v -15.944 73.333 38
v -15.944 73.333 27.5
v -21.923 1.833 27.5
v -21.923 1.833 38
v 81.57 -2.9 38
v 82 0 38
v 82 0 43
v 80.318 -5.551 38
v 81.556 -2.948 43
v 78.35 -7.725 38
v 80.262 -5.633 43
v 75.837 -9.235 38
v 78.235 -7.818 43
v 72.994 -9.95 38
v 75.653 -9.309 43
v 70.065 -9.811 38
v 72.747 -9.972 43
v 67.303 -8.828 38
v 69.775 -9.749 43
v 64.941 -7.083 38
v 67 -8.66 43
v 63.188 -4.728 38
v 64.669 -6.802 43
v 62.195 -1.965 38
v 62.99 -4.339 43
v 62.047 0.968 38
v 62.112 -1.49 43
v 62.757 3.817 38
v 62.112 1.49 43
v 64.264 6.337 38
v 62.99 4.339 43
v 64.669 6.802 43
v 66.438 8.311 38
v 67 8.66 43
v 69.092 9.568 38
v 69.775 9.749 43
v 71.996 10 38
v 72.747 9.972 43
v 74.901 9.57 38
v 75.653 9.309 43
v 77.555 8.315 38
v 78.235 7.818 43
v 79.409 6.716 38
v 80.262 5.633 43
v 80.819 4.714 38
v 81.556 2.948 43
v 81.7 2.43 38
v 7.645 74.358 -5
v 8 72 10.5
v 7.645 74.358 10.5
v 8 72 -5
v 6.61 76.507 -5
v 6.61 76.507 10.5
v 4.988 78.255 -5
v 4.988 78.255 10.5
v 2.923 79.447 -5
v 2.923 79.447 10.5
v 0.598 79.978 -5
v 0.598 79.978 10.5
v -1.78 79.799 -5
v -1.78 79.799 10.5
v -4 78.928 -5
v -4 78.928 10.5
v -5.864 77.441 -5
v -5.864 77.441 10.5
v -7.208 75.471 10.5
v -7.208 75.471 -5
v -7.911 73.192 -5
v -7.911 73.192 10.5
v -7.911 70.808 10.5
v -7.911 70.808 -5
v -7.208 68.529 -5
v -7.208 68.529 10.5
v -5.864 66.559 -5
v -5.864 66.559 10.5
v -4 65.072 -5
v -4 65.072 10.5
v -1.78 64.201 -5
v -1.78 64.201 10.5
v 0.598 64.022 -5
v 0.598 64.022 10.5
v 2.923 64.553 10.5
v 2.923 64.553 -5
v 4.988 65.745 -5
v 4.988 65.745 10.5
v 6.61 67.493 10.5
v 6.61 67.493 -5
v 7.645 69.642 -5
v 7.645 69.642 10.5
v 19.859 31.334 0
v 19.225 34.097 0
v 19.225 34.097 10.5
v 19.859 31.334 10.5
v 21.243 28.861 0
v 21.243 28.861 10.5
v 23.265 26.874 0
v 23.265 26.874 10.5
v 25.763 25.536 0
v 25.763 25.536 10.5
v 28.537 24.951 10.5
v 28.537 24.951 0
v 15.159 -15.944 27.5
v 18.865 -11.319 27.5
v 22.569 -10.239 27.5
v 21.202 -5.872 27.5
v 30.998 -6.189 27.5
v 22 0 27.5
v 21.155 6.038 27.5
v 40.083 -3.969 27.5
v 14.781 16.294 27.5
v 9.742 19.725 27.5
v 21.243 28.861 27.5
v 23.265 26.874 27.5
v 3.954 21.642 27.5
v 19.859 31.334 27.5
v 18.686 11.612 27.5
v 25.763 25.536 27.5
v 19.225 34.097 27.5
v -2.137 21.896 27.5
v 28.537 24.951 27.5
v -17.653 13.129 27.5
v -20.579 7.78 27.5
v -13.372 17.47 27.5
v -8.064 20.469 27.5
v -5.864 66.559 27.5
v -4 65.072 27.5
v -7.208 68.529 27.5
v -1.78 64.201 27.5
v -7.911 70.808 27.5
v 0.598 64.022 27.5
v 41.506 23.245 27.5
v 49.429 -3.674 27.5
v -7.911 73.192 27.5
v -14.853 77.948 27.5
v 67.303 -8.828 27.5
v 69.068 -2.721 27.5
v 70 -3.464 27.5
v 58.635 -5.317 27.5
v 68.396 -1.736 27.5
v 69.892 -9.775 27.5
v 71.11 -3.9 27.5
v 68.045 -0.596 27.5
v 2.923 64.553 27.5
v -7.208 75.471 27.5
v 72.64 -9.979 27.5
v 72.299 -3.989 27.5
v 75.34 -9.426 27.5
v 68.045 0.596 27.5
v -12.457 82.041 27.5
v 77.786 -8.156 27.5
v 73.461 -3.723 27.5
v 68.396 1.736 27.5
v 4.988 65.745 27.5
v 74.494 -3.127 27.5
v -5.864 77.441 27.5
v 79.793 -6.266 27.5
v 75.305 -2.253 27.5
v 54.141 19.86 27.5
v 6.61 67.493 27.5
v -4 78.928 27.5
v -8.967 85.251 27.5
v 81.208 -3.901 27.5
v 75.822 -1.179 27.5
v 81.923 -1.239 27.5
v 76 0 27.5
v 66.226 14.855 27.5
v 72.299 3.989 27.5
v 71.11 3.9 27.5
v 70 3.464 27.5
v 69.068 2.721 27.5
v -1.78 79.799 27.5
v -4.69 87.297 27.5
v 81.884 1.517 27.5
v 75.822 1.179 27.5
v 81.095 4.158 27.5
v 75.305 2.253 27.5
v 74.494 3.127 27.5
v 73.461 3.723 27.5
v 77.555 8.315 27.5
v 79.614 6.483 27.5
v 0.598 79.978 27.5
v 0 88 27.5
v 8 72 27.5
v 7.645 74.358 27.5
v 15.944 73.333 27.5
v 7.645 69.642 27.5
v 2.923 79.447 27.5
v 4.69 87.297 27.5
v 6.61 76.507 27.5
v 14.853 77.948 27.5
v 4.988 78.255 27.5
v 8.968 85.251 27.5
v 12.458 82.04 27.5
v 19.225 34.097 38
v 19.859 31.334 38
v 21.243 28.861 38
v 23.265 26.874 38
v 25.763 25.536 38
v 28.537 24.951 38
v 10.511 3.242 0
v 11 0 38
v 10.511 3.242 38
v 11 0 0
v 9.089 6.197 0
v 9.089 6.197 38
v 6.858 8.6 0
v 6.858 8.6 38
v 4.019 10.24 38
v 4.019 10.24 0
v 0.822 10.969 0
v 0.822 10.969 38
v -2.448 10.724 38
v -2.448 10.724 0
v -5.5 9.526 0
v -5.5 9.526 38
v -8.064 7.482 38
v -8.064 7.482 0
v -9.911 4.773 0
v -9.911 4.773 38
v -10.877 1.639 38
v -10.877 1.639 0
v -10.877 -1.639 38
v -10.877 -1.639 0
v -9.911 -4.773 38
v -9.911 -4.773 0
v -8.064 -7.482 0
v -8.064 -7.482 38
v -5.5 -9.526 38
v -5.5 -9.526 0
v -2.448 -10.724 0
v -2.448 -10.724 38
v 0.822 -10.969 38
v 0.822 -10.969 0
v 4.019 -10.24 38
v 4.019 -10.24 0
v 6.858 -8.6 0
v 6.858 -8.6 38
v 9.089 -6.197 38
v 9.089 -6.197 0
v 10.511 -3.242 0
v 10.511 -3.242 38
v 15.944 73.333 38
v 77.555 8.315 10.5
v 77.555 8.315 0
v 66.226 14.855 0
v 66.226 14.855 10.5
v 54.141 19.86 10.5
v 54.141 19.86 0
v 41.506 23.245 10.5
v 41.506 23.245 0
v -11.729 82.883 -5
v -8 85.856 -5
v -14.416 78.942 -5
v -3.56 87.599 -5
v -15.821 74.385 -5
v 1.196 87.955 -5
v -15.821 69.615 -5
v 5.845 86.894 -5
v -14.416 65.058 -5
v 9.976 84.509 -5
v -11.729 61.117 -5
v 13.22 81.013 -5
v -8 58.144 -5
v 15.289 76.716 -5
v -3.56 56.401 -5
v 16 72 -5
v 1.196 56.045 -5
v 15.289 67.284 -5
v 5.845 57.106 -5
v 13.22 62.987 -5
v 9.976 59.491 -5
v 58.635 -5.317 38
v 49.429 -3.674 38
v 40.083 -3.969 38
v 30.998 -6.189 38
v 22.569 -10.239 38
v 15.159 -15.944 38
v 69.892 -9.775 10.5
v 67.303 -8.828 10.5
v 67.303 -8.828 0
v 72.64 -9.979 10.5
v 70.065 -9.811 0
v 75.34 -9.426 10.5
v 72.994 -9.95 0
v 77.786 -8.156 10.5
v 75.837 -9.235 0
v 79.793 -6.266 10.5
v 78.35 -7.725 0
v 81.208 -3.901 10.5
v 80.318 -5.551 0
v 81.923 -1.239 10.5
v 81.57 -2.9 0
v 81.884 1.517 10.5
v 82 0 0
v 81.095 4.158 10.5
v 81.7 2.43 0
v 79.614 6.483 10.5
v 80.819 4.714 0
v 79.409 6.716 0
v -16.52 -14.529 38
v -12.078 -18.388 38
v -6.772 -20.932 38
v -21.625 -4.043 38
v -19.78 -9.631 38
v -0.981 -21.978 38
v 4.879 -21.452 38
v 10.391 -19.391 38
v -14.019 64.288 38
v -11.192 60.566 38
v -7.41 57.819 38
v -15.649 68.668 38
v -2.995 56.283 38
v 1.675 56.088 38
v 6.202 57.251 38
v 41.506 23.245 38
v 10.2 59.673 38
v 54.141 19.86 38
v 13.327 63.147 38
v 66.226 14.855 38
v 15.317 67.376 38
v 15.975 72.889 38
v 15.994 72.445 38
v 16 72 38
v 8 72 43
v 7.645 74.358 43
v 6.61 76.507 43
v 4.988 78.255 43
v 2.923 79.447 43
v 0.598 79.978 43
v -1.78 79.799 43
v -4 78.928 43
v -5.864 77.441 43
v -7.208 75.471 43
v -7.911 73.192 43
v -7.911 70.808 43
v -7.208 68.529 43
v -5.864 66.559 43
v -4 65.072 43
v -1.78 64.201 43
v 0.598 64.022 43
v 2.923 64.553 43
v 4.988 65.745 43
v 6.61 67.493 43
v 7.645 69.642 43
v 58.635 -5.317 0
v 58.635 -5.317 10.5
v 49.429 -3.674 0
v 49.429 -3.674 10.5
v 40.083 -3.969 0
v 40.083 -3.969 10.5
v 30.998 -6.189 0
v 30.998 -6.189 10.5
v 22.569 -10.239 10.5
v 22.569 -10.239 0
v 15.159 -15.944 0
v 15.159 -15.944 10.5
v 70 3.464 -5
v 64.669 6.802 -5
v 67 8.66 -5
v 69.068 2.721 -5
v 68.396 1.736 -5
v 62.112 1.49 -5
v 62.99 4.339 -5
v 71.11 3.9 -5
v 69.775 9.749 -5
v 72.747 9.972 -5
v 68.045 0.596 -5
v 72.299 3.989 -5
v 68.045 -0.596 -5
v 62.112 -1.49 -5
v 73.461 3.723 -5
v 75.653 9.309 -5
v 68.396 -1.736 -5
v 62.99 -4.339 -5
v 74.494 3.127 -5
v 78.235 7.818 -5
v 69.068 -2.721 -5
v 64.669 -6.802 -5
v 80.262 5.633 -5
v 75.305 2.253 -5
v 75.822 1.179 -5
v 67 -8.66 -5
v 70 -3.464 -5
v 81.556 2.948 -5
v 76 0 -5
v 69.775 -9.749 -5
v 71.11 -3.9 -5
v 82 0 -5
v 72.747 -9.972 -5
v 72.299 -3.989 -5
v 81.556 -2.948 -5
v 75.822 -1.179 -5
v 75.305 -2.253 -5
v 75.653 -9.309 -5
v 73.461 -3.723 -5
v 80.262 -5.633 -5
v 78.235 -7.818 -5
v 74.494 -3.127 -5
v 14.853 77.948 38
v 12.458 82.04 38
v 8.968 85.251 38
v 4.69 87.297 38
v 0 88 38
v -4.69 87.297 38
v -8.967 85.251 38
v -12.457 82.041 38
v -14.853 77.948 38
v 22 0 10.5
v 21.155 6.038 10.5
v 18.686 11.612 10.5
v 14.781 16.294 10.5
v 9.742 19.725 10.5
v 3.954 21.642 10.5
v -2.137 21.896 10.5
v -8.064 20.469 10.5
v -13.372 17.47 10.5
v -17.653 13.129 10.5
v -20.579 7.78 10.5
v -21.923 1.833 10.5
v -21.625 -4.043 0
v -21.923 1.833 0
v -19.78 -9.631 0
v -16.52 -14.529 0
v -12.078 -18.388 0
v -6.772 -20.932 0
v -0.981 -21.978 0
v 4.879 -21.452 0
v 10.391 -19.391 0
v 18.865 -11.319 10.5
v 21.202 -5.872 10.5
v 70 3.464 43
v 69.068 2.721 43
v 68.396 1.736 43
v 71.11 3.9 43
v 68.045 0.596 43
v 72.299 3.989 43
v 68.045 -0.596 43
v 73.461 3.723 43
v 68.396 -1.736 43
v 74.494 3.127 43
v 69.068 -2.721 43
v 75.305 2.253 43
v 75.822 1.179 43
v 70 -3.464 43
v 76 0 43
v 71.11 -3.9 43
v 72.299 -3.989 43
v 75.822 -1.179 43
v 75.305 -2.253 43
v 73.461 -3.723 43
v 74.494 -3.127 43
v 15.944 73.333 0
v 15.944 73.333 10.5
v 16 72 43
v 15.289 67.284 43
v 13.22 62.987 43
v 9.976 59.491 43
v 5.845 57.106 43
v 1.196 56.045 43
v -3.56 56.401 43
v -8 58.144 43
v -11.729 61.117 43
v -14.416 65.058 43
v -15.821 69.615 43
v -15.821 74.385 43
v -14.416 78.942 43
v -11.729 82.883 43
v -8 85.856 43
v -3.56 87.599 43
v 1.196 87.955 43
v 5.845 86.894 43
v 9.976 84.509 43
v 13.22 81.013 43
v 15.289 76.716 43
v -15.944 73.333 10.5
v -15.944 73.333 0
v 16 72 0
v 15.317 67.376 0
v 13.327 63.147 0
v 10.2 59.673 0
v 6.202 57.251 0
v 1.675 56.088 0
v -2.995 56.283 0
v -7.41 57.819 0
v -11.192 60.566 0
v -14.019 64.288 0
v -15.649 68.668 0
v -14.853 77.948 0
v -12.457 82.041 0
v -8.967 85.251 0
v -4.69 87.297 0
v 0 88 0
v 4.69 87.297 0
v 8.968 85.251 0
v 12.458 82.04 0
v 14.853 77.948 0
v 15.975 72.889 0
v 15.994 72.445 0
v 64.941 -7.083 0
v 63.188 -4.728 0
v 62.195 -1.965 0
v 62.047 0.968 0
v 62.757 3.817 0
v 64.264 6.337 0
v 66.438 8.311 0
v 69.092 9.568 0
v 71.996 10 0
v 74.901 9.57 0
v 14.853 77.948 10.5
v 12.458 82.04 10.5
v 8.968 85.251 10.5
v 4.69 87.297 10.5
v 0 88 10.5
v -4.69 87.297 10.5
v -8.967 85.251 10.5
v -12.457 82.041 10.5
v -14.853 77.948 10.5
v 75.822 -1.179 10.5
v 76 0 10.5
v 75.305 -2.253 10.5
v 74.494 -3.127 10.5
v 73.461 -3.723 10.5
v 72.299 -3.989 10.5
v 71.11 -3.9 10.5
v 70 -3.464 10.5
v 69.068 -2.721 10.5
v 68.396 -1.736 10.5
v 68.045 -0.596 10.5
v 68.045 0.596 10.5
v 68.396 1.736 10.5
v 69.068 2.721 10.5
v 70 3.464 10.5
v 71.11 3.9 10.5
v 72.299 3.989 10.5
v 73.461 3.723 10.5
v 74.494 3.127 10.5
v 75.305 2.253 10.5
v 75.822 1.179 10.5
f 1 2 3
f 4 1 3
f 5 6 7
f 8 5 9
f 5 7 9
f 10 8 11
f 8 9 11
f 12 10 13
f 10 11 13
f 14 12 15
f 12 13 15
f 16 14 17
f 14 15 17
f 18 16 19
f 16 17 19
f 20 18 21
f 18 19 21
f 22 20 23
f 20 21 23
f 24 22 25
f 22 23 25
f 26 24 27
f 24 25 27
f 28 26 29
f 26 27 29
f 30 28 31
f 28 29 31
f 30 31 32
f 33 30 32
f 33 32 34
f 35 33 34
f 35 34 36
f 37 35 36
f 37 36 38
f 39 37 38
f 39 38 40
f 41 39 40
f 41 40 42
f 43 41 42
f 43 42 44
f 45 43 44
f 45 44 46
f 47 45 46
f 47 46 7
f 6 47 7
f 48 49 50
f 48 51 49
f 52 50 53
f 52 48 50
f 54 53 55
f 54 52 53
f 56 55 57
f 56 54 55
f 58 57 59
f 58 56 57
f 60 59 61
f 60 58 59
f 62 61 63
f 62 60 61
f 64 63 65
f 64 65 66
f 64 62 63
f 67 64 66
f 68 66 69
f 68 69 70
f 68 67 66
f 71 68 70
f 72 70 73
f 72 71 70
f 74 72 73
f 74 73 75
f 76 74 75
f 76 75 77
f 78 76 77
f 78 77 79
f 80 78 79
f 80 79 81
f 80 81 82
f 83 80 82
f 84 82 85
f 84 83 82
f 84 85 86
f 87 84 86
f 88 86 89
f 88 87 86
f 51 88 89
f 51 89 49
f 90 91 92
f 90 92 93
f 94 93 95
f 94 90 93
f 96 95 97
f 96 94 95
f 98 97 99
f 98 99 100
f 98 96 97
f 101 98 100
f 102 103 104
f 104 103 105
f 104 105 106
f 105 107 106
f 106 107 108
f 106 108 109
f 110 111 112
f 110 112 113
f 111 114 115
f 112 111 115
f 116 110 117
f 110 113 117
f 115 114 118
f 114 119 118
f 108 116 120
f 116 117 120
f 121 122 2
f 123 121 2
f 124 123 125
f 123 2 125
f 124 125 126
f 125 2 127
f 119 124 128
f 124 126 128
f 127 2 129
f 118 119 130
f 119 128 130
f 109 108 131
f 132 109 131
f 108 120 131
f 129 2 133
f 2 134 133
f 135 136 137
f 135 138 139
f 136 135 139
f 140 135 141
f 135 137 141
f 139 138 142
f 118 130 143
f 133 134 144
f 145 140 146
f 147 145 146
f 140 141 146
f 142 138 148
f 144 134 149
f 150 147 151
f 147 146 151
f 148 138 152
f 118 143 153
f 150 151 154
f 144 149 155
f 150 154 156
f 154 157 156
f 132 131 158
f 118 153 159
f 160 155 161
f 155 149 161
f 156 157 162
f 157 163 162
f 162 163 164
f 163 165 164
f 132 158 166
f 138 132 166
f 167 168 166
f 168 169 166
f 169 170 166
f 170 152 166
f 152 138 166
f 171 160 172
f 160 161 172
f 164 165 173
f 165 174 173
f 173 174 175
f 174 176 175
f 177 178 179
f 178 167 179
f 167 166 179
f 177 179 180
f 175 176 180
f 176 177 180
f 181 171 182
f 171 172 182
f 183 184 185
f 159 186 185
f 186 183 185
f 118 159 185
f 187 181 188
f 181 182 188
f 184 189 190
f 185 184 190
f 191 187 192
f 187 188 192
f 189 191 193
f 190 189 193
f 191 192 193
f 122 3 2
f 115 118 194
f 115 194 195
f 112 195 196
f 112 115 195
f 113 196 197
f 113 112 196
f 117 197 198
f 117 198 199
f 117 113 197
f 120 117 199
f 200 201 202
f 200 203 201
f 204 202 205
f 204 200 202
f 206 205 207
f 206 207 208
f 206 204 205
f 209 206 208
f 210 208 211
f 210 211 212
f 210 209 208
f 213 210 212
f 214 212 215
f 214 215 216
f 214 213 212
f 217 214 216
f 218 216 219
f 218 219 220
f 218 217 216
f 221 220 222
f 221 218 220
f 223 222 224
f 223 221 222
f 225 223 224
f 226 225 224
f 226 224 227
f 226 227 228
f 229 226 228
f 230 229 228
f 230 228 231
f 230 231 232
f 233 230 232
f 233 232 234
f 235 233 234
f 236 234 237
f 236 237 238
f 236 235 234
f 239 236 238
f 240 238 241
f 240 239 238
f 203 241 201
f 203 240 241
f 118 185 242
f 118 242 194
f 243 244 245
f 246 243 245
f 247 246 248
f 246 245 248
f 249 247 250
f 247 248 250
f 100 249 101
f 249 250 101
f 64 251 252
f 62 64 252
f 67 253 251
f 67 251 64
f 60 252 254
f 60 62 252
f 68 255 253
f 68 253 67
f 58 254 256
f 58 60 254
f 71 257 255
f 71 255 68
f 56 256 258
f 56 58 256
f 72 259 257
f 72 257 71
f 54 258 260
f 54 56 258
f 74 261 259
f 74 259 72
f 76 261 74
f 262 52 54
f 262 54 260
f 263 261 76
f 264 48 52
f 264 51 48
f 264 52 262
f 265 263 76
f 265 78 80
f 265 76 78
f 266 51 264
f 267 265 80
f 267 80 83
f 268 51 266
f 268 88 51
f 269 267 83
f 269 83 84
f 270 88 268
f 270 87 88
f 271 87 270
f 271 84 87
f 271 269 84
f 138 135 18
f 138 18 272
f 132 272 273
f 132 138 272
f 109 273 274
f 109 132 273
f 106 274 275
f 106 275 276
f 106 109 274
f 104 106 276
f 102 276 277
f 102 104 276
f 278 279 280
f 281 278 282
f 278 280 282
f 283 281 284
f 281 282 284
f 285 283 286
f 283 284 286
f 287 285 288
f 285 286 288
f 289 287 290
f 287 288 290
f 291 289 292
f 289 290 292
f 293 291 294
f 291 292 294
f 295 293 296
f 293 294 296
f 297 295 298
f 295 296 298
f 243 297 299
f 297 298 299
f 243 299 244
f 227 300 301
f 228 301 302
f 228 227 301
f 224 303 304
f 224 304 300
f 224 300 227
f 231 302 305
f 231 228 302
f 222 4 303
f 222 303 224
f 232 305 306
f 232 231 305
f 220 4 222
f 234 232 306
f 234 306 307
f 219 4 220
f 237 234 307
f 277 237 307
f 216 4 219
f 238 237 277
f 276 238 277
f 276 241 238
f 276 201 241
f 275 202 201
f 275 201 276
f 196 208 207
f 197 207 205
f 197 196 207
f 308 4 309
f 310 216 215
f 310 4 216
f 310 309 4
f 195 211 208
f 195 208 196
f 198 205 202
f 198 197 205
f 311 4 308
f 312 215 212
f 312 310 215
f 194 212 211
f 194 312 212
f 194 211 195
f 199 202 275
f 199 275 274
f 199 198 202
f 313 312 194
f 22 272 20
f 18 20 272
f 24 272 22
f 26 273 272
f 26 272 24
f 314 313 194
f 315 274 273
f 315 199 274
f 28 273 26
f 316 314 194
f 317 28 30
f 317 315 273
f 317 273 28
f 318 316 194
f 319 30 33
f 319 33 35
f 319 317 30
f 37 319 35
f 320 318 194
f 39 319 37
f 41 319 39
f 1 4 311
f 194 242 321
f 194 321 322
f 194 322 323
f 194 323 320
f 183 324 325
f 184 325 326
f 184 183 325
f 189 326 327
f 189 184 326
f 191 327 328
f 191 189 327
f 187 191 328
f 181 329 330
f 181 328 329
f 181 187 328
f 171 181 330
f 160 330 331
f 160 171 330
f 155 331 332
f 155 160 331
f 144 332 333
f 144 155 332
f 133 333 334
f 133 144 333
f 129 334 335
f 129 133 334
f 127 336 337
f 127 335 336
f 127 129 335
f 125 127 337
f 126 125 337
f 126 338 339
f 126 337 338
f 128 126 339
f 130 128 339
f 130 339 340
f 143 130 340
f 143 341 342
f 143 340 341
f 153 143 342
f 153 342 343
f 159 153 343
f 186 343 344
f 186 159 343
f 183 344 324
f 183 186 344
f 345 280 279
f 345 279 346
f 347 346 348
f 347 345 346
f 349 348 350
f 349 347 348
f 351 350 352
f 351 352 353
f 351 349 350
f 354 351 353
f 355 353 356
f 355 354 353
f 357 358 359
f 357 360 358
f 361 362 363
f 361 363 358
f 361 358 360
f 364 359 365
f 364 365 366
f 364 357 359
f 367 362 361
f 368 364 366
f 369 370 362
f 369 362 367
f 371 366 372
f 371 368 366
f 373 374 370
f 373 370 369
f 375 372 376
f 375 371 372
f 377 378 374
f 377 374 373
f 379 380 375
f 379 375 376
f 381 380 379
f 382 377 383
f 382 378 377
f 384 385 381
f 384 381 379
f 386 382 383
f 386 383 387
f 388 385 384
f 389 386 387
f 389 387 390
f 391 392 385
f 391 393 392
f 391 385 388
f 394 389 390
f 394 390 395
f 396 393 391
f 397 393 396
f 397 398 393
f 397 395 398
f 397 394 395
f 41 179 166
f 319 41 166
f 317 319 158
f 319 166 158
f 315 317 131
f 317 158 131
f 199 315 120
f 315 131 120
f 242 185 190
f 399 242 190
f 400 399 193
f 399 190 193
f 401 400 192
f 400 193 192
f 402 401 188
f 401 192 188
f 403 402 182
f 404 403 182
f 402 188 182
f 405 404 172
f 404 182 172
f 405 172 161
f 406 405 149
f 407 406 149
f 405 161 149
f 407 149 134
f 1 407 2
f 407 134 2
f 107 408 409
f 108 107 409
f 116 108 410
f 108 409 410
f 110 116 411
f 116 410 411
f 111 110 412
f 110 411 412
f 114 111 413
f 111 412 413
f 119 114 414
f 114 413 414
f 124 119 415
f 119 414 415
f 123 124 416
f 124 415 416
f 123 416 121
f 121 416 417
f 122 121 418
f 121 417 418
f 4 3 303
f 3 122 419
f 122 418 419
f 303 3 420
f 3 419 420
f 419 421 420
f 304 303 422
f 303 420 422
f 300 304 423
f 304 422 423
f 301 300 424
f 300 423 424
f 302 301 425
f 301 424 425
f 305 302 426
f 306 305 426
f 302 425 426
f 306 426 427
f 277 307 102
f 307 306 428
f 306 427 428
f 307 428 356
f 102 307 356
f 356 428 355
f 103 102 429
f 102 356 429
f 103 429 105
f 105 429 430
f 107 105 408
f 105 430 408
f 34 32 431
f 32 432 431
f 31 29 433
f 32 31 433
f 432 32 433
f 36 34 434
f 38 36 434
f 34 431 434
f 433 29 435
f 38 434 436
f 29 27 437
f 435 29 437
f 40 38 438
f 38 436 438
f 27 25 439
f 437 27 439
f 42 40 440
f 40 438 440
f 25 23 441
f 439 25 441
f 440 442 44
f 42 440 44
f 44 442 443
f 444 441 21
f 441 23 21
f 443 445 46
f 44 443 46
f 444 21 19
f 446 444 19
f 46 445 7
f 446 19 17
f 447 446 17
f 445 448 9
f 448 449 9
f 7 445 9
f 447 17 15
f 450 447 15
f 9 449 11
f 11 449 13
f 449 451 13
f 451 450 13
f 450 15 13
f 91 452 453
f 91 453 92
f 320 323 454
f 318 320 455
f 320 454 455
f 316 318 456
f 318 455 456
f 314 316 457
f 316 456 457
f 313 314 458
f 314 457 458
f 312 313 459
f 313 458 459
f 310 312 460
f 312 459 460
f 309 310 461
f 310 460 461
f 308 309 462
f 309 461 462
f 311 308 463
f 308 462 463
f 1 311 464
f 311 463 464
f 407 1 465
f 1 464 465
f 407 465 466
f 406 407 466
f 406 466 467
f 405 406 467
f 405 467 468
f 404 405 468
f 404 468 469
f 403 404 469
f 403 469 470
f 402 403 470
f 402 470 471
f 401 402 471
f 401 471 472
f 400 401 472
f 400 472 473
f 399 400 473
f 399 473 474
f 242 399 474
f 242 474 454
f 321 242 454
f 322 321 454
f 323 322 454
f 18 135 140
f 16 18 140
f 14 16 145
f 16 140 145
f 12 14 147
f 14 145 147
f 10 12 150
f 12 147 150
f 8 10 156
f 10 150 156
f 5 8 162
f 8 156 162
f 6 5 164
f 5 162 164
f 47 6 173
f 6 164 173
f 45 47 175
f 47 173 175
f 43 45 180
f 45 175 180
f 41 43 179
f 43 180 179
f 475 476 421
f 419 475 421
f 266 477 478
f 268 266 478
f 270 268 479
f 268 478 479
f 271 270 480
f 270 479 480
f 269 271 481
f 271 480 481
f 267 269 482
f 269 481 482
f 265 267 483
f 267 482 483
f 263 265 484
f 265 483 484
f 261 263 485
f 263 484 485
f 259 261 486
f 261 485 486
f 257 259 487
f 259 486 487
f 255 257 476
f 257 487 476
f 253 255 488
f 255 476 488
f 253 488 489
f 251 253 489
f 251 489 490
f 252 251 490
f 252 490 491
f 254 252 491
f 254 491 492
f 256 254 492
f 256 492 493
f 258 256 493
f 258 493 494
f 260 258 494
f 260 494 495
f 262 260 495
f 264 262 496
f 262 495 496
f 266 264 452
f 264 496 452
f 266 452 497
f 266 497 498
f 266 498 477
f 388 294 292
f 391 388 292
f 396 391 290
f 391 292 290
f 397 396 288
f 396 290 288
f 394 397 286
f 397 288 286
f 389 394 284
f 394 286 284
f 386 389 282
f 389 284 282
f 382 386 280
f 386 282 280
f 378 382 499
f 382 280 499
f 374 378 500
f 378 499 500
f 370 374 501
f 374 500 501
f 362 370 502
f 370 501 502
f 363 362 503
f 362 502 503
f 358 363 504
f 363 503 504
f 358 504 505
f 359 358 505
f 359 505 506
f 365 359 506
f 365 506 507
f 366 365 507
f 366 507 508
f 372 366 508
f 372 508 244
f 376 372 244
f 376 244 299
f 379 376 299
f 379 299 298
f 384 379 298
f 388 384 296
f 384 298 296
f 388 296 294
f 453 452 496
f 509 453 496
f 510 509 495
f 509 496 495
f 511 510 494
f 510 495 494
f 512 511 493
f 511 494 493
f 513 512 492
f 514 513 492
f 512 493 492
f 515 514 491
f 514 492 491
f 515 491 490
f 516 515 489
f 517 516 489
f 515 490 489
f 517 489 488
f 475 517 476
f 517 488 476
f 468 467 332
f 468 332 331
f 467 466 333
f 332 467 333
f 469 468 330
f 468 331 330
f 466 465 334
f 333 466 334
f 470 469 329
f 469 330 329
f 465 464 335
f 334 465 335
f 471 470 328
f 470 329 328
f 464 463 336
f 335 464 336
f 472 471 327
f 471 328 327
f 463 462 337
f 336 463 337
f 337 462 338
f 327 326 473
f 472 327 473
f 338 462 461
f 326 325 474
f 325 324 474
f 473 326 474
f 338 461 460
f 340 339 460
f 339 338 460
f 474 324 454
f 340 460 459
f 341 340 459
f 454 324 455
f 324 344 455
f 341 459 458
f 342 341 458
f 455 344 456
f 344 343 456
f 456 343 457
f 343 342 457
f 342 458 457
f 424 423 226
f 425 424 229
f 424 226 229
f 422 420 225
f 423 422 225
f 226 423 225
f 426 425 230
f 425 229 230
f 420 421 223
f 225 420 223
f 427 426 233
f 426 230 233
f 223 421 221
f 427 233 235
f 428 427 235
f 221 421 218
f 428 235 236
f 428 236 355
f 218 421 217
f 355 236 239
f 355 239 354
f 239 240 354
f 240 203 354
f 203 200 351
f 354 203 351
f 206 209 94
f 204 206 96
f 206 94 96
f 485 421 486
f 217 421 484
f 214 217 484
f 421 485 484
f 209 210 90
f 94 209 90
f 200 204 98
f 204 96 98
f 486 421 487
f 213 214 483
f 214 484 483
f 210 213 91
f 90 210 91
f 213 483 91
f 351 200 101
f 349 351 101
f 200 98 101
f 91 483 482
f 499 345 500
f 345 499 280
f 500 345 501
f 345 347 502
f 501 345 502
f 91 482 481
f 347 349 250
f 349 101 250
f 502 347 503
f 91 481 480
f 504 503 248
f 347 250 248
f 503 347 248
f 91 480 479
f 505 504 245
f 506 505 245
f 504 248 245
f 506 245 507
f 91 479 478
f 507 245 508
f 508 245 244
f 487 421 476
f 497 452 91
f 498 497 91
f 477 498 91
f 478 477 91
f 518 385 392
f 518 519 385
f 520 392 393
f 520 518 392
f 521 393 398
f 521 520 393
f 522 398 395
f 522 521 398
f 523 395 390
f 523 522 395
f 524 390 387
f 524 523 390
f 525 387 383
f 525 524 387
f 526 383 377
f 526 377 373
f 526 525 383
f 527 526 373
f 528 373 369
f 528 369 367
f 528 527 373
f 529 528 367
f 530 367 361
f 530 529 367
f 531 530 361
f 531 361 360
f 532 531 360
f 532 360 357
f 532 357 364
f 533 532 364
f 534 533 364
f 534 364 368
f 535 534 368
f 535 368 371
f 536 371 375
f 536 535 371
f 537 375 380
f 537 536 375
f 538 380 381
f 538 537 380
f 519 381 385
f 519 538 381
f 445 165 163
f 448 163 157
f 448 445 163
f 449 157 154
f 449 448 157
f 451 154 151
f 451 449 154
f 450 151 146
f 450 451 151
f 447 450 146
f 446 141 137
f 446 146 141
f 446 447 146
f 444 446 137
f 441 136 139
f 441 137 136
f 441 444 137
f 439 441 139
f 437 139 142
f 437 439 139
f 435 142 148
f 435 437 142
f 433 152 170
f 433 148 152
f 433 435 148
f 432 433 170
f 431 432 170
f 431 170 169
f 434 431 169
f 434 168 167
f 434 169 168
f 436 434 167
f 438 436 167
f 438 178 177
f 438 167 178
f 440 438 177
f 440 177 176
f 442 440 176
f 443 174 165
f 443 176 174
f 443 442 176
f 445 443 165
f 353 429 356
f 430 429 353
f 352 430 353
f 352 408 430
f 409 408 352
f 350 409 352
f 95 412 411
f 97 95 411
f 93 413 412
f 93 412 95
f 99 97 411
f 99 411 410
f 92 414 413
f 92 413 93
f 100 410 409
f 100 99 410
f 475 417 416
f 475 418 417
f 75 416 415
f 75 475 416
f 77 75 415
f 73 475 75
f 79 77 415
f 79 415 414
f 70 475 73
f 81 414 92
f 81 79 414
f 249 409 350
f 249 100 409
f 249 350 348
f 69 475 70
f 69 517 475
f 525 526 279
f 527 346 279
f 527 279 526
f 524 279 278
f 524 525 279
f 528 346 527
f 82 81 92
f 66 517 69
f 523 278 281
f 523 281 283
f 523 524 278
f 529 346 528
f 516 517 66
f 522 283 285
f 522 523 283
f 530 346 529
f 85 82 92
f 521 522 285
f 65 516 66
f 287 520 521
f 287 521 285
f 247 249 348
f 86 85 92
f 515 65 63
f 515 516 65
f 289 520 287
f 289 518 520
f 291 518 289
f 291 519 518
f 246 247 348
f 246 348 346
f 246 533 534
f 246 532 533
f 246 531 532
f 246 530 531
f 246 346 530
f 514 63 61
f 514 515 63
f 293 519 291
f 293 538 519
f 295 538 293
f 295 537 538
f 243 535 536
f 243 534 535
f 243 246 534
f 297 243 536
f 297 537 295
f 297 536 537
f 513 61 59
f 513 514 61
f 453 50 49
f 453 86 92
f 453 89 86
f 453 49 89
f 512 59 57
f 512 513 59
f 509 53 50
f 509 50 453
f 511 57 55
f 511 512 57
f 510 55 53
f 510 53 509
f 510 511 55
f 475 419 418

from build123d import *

# Parameters (mm, degrees)
SKETCH_R               = 11
SKETCH_R_2             = 4
SKETCH_R_3             = 8
PAD_DEPTH              = 10.5
SKETCH001_R            = 22
SKETCH001_R_2          = 11
PAD001_DEPTH           = 27.5
SKETCH002_R            = 10
SKETCH002_R_2          = 4
SKETCH002_R_3          = 16
SKETCH002_R_4          = 8
PAD002_DEPTH           = 5
LINEARPATTERN_COUNT    = 2
LINEARPATTERN_PITCH    = 27.5
LINEARPATTERN001_COUNT = 2
LINEARPATTERN001_PITCH = 43


with BuildPart() as part:
    # Sketch → Pad (new body)
    with BuildSketch(Plane.XY):
        with BuildLine():
            ThreePointArc((-21.9234781804, 1.8333315232), (-9.5101896489, -19.8382532709), (15.1592048803, -15.9436039651))
            ThreePointArc((67.303030561, -8.8282771869), (40.0825387761, -3.968716444), (15.1592048803, -15.9436039651))
            ThreePointArc((67.303030561, -8.8282771869), (80.5823809431, -5.1325176421), (77.5552259696, 8.3150143973))
            ThreePointArc((77.5552259696, 8.3150143973), (54.1410477348, 19.8599663381), (28.5366090857, 24.9513688157))
            ThreePointArc((19.2247688114, 34.0968329356), (22.1829562344, 27.7954826606), (28.5366090857, 24.9513688157))
            Line((15.9443712103, 73.3330516519), (19.2247688114, 34.0968329356))
            ThreePointArc((15.9443712103, 73.3330516519), (0.000141406, 87.9999999994), (-15.9443476452, 73.3333334805))
            Line((-15.9443476452, 73.3333334805), (-21.9234781804, 1.8333315232))
        make_face()
        Circle(SKETCH_R, mode=Mode.SUBTRACT)
        with Locations((72, 0)):
            Circle(SKETCH_R_2, mode=Mode.SUBTRACT)
        with Locations((0, 72)):
            Circle(SKETCH_R_3, mode=Mode.SUBTRACT)
    pad = extrude(amount=PAD_DEPTH)

    # Sketch001 (on Face13 of Pad) → Pad001 (join)
    with BuildSketch(Plane.XY.offset(10.5)):
        Circle(SKETCH001_R)
        Circle(SKETCH001_R_2, mode=Mode.SUBTRACT)
    extrude(amount=PAD001_DEPTH)

    # Sketch002 (on Face4 of Pad001) → Pad002 (join)
    with BuildSketch(Plane(origin=(0, 0, 0), x_dir=(1, 0, 0), z_dir=(0, 0, -1))):
        with Locations((72, 0)):
            Circle(SKETCH002_R)
        with Locations((72, 0)):
            Circle(SKETCH002_R_2, mode=Mode.SUBTRACT)
        with Locations((0, -72)):
            Circle(SKETCH002_R_3)
        with Locations((0, -72)):
            Circle(SKETCH002_R_4, mode=Mode.SUBTRACT)
    pad002 = extrude(amount=PAD002_DEPTH)

    # LinearPattern: Pad ×2
    with Locations(*[(0, 0, i * LINEARPATTERN_PITCH) for i in range(1, LINEARPATTERN_COUNT)]):
        add(pad)

    # LinearPattern001: Pad002 ×2
    with Locations(*[(0, 0, i * LINEARPATTERN001_PITCH) for i in range(1, LINEARPATTERN001_COUNT)]):
        add(pad002)


solid = part.part
